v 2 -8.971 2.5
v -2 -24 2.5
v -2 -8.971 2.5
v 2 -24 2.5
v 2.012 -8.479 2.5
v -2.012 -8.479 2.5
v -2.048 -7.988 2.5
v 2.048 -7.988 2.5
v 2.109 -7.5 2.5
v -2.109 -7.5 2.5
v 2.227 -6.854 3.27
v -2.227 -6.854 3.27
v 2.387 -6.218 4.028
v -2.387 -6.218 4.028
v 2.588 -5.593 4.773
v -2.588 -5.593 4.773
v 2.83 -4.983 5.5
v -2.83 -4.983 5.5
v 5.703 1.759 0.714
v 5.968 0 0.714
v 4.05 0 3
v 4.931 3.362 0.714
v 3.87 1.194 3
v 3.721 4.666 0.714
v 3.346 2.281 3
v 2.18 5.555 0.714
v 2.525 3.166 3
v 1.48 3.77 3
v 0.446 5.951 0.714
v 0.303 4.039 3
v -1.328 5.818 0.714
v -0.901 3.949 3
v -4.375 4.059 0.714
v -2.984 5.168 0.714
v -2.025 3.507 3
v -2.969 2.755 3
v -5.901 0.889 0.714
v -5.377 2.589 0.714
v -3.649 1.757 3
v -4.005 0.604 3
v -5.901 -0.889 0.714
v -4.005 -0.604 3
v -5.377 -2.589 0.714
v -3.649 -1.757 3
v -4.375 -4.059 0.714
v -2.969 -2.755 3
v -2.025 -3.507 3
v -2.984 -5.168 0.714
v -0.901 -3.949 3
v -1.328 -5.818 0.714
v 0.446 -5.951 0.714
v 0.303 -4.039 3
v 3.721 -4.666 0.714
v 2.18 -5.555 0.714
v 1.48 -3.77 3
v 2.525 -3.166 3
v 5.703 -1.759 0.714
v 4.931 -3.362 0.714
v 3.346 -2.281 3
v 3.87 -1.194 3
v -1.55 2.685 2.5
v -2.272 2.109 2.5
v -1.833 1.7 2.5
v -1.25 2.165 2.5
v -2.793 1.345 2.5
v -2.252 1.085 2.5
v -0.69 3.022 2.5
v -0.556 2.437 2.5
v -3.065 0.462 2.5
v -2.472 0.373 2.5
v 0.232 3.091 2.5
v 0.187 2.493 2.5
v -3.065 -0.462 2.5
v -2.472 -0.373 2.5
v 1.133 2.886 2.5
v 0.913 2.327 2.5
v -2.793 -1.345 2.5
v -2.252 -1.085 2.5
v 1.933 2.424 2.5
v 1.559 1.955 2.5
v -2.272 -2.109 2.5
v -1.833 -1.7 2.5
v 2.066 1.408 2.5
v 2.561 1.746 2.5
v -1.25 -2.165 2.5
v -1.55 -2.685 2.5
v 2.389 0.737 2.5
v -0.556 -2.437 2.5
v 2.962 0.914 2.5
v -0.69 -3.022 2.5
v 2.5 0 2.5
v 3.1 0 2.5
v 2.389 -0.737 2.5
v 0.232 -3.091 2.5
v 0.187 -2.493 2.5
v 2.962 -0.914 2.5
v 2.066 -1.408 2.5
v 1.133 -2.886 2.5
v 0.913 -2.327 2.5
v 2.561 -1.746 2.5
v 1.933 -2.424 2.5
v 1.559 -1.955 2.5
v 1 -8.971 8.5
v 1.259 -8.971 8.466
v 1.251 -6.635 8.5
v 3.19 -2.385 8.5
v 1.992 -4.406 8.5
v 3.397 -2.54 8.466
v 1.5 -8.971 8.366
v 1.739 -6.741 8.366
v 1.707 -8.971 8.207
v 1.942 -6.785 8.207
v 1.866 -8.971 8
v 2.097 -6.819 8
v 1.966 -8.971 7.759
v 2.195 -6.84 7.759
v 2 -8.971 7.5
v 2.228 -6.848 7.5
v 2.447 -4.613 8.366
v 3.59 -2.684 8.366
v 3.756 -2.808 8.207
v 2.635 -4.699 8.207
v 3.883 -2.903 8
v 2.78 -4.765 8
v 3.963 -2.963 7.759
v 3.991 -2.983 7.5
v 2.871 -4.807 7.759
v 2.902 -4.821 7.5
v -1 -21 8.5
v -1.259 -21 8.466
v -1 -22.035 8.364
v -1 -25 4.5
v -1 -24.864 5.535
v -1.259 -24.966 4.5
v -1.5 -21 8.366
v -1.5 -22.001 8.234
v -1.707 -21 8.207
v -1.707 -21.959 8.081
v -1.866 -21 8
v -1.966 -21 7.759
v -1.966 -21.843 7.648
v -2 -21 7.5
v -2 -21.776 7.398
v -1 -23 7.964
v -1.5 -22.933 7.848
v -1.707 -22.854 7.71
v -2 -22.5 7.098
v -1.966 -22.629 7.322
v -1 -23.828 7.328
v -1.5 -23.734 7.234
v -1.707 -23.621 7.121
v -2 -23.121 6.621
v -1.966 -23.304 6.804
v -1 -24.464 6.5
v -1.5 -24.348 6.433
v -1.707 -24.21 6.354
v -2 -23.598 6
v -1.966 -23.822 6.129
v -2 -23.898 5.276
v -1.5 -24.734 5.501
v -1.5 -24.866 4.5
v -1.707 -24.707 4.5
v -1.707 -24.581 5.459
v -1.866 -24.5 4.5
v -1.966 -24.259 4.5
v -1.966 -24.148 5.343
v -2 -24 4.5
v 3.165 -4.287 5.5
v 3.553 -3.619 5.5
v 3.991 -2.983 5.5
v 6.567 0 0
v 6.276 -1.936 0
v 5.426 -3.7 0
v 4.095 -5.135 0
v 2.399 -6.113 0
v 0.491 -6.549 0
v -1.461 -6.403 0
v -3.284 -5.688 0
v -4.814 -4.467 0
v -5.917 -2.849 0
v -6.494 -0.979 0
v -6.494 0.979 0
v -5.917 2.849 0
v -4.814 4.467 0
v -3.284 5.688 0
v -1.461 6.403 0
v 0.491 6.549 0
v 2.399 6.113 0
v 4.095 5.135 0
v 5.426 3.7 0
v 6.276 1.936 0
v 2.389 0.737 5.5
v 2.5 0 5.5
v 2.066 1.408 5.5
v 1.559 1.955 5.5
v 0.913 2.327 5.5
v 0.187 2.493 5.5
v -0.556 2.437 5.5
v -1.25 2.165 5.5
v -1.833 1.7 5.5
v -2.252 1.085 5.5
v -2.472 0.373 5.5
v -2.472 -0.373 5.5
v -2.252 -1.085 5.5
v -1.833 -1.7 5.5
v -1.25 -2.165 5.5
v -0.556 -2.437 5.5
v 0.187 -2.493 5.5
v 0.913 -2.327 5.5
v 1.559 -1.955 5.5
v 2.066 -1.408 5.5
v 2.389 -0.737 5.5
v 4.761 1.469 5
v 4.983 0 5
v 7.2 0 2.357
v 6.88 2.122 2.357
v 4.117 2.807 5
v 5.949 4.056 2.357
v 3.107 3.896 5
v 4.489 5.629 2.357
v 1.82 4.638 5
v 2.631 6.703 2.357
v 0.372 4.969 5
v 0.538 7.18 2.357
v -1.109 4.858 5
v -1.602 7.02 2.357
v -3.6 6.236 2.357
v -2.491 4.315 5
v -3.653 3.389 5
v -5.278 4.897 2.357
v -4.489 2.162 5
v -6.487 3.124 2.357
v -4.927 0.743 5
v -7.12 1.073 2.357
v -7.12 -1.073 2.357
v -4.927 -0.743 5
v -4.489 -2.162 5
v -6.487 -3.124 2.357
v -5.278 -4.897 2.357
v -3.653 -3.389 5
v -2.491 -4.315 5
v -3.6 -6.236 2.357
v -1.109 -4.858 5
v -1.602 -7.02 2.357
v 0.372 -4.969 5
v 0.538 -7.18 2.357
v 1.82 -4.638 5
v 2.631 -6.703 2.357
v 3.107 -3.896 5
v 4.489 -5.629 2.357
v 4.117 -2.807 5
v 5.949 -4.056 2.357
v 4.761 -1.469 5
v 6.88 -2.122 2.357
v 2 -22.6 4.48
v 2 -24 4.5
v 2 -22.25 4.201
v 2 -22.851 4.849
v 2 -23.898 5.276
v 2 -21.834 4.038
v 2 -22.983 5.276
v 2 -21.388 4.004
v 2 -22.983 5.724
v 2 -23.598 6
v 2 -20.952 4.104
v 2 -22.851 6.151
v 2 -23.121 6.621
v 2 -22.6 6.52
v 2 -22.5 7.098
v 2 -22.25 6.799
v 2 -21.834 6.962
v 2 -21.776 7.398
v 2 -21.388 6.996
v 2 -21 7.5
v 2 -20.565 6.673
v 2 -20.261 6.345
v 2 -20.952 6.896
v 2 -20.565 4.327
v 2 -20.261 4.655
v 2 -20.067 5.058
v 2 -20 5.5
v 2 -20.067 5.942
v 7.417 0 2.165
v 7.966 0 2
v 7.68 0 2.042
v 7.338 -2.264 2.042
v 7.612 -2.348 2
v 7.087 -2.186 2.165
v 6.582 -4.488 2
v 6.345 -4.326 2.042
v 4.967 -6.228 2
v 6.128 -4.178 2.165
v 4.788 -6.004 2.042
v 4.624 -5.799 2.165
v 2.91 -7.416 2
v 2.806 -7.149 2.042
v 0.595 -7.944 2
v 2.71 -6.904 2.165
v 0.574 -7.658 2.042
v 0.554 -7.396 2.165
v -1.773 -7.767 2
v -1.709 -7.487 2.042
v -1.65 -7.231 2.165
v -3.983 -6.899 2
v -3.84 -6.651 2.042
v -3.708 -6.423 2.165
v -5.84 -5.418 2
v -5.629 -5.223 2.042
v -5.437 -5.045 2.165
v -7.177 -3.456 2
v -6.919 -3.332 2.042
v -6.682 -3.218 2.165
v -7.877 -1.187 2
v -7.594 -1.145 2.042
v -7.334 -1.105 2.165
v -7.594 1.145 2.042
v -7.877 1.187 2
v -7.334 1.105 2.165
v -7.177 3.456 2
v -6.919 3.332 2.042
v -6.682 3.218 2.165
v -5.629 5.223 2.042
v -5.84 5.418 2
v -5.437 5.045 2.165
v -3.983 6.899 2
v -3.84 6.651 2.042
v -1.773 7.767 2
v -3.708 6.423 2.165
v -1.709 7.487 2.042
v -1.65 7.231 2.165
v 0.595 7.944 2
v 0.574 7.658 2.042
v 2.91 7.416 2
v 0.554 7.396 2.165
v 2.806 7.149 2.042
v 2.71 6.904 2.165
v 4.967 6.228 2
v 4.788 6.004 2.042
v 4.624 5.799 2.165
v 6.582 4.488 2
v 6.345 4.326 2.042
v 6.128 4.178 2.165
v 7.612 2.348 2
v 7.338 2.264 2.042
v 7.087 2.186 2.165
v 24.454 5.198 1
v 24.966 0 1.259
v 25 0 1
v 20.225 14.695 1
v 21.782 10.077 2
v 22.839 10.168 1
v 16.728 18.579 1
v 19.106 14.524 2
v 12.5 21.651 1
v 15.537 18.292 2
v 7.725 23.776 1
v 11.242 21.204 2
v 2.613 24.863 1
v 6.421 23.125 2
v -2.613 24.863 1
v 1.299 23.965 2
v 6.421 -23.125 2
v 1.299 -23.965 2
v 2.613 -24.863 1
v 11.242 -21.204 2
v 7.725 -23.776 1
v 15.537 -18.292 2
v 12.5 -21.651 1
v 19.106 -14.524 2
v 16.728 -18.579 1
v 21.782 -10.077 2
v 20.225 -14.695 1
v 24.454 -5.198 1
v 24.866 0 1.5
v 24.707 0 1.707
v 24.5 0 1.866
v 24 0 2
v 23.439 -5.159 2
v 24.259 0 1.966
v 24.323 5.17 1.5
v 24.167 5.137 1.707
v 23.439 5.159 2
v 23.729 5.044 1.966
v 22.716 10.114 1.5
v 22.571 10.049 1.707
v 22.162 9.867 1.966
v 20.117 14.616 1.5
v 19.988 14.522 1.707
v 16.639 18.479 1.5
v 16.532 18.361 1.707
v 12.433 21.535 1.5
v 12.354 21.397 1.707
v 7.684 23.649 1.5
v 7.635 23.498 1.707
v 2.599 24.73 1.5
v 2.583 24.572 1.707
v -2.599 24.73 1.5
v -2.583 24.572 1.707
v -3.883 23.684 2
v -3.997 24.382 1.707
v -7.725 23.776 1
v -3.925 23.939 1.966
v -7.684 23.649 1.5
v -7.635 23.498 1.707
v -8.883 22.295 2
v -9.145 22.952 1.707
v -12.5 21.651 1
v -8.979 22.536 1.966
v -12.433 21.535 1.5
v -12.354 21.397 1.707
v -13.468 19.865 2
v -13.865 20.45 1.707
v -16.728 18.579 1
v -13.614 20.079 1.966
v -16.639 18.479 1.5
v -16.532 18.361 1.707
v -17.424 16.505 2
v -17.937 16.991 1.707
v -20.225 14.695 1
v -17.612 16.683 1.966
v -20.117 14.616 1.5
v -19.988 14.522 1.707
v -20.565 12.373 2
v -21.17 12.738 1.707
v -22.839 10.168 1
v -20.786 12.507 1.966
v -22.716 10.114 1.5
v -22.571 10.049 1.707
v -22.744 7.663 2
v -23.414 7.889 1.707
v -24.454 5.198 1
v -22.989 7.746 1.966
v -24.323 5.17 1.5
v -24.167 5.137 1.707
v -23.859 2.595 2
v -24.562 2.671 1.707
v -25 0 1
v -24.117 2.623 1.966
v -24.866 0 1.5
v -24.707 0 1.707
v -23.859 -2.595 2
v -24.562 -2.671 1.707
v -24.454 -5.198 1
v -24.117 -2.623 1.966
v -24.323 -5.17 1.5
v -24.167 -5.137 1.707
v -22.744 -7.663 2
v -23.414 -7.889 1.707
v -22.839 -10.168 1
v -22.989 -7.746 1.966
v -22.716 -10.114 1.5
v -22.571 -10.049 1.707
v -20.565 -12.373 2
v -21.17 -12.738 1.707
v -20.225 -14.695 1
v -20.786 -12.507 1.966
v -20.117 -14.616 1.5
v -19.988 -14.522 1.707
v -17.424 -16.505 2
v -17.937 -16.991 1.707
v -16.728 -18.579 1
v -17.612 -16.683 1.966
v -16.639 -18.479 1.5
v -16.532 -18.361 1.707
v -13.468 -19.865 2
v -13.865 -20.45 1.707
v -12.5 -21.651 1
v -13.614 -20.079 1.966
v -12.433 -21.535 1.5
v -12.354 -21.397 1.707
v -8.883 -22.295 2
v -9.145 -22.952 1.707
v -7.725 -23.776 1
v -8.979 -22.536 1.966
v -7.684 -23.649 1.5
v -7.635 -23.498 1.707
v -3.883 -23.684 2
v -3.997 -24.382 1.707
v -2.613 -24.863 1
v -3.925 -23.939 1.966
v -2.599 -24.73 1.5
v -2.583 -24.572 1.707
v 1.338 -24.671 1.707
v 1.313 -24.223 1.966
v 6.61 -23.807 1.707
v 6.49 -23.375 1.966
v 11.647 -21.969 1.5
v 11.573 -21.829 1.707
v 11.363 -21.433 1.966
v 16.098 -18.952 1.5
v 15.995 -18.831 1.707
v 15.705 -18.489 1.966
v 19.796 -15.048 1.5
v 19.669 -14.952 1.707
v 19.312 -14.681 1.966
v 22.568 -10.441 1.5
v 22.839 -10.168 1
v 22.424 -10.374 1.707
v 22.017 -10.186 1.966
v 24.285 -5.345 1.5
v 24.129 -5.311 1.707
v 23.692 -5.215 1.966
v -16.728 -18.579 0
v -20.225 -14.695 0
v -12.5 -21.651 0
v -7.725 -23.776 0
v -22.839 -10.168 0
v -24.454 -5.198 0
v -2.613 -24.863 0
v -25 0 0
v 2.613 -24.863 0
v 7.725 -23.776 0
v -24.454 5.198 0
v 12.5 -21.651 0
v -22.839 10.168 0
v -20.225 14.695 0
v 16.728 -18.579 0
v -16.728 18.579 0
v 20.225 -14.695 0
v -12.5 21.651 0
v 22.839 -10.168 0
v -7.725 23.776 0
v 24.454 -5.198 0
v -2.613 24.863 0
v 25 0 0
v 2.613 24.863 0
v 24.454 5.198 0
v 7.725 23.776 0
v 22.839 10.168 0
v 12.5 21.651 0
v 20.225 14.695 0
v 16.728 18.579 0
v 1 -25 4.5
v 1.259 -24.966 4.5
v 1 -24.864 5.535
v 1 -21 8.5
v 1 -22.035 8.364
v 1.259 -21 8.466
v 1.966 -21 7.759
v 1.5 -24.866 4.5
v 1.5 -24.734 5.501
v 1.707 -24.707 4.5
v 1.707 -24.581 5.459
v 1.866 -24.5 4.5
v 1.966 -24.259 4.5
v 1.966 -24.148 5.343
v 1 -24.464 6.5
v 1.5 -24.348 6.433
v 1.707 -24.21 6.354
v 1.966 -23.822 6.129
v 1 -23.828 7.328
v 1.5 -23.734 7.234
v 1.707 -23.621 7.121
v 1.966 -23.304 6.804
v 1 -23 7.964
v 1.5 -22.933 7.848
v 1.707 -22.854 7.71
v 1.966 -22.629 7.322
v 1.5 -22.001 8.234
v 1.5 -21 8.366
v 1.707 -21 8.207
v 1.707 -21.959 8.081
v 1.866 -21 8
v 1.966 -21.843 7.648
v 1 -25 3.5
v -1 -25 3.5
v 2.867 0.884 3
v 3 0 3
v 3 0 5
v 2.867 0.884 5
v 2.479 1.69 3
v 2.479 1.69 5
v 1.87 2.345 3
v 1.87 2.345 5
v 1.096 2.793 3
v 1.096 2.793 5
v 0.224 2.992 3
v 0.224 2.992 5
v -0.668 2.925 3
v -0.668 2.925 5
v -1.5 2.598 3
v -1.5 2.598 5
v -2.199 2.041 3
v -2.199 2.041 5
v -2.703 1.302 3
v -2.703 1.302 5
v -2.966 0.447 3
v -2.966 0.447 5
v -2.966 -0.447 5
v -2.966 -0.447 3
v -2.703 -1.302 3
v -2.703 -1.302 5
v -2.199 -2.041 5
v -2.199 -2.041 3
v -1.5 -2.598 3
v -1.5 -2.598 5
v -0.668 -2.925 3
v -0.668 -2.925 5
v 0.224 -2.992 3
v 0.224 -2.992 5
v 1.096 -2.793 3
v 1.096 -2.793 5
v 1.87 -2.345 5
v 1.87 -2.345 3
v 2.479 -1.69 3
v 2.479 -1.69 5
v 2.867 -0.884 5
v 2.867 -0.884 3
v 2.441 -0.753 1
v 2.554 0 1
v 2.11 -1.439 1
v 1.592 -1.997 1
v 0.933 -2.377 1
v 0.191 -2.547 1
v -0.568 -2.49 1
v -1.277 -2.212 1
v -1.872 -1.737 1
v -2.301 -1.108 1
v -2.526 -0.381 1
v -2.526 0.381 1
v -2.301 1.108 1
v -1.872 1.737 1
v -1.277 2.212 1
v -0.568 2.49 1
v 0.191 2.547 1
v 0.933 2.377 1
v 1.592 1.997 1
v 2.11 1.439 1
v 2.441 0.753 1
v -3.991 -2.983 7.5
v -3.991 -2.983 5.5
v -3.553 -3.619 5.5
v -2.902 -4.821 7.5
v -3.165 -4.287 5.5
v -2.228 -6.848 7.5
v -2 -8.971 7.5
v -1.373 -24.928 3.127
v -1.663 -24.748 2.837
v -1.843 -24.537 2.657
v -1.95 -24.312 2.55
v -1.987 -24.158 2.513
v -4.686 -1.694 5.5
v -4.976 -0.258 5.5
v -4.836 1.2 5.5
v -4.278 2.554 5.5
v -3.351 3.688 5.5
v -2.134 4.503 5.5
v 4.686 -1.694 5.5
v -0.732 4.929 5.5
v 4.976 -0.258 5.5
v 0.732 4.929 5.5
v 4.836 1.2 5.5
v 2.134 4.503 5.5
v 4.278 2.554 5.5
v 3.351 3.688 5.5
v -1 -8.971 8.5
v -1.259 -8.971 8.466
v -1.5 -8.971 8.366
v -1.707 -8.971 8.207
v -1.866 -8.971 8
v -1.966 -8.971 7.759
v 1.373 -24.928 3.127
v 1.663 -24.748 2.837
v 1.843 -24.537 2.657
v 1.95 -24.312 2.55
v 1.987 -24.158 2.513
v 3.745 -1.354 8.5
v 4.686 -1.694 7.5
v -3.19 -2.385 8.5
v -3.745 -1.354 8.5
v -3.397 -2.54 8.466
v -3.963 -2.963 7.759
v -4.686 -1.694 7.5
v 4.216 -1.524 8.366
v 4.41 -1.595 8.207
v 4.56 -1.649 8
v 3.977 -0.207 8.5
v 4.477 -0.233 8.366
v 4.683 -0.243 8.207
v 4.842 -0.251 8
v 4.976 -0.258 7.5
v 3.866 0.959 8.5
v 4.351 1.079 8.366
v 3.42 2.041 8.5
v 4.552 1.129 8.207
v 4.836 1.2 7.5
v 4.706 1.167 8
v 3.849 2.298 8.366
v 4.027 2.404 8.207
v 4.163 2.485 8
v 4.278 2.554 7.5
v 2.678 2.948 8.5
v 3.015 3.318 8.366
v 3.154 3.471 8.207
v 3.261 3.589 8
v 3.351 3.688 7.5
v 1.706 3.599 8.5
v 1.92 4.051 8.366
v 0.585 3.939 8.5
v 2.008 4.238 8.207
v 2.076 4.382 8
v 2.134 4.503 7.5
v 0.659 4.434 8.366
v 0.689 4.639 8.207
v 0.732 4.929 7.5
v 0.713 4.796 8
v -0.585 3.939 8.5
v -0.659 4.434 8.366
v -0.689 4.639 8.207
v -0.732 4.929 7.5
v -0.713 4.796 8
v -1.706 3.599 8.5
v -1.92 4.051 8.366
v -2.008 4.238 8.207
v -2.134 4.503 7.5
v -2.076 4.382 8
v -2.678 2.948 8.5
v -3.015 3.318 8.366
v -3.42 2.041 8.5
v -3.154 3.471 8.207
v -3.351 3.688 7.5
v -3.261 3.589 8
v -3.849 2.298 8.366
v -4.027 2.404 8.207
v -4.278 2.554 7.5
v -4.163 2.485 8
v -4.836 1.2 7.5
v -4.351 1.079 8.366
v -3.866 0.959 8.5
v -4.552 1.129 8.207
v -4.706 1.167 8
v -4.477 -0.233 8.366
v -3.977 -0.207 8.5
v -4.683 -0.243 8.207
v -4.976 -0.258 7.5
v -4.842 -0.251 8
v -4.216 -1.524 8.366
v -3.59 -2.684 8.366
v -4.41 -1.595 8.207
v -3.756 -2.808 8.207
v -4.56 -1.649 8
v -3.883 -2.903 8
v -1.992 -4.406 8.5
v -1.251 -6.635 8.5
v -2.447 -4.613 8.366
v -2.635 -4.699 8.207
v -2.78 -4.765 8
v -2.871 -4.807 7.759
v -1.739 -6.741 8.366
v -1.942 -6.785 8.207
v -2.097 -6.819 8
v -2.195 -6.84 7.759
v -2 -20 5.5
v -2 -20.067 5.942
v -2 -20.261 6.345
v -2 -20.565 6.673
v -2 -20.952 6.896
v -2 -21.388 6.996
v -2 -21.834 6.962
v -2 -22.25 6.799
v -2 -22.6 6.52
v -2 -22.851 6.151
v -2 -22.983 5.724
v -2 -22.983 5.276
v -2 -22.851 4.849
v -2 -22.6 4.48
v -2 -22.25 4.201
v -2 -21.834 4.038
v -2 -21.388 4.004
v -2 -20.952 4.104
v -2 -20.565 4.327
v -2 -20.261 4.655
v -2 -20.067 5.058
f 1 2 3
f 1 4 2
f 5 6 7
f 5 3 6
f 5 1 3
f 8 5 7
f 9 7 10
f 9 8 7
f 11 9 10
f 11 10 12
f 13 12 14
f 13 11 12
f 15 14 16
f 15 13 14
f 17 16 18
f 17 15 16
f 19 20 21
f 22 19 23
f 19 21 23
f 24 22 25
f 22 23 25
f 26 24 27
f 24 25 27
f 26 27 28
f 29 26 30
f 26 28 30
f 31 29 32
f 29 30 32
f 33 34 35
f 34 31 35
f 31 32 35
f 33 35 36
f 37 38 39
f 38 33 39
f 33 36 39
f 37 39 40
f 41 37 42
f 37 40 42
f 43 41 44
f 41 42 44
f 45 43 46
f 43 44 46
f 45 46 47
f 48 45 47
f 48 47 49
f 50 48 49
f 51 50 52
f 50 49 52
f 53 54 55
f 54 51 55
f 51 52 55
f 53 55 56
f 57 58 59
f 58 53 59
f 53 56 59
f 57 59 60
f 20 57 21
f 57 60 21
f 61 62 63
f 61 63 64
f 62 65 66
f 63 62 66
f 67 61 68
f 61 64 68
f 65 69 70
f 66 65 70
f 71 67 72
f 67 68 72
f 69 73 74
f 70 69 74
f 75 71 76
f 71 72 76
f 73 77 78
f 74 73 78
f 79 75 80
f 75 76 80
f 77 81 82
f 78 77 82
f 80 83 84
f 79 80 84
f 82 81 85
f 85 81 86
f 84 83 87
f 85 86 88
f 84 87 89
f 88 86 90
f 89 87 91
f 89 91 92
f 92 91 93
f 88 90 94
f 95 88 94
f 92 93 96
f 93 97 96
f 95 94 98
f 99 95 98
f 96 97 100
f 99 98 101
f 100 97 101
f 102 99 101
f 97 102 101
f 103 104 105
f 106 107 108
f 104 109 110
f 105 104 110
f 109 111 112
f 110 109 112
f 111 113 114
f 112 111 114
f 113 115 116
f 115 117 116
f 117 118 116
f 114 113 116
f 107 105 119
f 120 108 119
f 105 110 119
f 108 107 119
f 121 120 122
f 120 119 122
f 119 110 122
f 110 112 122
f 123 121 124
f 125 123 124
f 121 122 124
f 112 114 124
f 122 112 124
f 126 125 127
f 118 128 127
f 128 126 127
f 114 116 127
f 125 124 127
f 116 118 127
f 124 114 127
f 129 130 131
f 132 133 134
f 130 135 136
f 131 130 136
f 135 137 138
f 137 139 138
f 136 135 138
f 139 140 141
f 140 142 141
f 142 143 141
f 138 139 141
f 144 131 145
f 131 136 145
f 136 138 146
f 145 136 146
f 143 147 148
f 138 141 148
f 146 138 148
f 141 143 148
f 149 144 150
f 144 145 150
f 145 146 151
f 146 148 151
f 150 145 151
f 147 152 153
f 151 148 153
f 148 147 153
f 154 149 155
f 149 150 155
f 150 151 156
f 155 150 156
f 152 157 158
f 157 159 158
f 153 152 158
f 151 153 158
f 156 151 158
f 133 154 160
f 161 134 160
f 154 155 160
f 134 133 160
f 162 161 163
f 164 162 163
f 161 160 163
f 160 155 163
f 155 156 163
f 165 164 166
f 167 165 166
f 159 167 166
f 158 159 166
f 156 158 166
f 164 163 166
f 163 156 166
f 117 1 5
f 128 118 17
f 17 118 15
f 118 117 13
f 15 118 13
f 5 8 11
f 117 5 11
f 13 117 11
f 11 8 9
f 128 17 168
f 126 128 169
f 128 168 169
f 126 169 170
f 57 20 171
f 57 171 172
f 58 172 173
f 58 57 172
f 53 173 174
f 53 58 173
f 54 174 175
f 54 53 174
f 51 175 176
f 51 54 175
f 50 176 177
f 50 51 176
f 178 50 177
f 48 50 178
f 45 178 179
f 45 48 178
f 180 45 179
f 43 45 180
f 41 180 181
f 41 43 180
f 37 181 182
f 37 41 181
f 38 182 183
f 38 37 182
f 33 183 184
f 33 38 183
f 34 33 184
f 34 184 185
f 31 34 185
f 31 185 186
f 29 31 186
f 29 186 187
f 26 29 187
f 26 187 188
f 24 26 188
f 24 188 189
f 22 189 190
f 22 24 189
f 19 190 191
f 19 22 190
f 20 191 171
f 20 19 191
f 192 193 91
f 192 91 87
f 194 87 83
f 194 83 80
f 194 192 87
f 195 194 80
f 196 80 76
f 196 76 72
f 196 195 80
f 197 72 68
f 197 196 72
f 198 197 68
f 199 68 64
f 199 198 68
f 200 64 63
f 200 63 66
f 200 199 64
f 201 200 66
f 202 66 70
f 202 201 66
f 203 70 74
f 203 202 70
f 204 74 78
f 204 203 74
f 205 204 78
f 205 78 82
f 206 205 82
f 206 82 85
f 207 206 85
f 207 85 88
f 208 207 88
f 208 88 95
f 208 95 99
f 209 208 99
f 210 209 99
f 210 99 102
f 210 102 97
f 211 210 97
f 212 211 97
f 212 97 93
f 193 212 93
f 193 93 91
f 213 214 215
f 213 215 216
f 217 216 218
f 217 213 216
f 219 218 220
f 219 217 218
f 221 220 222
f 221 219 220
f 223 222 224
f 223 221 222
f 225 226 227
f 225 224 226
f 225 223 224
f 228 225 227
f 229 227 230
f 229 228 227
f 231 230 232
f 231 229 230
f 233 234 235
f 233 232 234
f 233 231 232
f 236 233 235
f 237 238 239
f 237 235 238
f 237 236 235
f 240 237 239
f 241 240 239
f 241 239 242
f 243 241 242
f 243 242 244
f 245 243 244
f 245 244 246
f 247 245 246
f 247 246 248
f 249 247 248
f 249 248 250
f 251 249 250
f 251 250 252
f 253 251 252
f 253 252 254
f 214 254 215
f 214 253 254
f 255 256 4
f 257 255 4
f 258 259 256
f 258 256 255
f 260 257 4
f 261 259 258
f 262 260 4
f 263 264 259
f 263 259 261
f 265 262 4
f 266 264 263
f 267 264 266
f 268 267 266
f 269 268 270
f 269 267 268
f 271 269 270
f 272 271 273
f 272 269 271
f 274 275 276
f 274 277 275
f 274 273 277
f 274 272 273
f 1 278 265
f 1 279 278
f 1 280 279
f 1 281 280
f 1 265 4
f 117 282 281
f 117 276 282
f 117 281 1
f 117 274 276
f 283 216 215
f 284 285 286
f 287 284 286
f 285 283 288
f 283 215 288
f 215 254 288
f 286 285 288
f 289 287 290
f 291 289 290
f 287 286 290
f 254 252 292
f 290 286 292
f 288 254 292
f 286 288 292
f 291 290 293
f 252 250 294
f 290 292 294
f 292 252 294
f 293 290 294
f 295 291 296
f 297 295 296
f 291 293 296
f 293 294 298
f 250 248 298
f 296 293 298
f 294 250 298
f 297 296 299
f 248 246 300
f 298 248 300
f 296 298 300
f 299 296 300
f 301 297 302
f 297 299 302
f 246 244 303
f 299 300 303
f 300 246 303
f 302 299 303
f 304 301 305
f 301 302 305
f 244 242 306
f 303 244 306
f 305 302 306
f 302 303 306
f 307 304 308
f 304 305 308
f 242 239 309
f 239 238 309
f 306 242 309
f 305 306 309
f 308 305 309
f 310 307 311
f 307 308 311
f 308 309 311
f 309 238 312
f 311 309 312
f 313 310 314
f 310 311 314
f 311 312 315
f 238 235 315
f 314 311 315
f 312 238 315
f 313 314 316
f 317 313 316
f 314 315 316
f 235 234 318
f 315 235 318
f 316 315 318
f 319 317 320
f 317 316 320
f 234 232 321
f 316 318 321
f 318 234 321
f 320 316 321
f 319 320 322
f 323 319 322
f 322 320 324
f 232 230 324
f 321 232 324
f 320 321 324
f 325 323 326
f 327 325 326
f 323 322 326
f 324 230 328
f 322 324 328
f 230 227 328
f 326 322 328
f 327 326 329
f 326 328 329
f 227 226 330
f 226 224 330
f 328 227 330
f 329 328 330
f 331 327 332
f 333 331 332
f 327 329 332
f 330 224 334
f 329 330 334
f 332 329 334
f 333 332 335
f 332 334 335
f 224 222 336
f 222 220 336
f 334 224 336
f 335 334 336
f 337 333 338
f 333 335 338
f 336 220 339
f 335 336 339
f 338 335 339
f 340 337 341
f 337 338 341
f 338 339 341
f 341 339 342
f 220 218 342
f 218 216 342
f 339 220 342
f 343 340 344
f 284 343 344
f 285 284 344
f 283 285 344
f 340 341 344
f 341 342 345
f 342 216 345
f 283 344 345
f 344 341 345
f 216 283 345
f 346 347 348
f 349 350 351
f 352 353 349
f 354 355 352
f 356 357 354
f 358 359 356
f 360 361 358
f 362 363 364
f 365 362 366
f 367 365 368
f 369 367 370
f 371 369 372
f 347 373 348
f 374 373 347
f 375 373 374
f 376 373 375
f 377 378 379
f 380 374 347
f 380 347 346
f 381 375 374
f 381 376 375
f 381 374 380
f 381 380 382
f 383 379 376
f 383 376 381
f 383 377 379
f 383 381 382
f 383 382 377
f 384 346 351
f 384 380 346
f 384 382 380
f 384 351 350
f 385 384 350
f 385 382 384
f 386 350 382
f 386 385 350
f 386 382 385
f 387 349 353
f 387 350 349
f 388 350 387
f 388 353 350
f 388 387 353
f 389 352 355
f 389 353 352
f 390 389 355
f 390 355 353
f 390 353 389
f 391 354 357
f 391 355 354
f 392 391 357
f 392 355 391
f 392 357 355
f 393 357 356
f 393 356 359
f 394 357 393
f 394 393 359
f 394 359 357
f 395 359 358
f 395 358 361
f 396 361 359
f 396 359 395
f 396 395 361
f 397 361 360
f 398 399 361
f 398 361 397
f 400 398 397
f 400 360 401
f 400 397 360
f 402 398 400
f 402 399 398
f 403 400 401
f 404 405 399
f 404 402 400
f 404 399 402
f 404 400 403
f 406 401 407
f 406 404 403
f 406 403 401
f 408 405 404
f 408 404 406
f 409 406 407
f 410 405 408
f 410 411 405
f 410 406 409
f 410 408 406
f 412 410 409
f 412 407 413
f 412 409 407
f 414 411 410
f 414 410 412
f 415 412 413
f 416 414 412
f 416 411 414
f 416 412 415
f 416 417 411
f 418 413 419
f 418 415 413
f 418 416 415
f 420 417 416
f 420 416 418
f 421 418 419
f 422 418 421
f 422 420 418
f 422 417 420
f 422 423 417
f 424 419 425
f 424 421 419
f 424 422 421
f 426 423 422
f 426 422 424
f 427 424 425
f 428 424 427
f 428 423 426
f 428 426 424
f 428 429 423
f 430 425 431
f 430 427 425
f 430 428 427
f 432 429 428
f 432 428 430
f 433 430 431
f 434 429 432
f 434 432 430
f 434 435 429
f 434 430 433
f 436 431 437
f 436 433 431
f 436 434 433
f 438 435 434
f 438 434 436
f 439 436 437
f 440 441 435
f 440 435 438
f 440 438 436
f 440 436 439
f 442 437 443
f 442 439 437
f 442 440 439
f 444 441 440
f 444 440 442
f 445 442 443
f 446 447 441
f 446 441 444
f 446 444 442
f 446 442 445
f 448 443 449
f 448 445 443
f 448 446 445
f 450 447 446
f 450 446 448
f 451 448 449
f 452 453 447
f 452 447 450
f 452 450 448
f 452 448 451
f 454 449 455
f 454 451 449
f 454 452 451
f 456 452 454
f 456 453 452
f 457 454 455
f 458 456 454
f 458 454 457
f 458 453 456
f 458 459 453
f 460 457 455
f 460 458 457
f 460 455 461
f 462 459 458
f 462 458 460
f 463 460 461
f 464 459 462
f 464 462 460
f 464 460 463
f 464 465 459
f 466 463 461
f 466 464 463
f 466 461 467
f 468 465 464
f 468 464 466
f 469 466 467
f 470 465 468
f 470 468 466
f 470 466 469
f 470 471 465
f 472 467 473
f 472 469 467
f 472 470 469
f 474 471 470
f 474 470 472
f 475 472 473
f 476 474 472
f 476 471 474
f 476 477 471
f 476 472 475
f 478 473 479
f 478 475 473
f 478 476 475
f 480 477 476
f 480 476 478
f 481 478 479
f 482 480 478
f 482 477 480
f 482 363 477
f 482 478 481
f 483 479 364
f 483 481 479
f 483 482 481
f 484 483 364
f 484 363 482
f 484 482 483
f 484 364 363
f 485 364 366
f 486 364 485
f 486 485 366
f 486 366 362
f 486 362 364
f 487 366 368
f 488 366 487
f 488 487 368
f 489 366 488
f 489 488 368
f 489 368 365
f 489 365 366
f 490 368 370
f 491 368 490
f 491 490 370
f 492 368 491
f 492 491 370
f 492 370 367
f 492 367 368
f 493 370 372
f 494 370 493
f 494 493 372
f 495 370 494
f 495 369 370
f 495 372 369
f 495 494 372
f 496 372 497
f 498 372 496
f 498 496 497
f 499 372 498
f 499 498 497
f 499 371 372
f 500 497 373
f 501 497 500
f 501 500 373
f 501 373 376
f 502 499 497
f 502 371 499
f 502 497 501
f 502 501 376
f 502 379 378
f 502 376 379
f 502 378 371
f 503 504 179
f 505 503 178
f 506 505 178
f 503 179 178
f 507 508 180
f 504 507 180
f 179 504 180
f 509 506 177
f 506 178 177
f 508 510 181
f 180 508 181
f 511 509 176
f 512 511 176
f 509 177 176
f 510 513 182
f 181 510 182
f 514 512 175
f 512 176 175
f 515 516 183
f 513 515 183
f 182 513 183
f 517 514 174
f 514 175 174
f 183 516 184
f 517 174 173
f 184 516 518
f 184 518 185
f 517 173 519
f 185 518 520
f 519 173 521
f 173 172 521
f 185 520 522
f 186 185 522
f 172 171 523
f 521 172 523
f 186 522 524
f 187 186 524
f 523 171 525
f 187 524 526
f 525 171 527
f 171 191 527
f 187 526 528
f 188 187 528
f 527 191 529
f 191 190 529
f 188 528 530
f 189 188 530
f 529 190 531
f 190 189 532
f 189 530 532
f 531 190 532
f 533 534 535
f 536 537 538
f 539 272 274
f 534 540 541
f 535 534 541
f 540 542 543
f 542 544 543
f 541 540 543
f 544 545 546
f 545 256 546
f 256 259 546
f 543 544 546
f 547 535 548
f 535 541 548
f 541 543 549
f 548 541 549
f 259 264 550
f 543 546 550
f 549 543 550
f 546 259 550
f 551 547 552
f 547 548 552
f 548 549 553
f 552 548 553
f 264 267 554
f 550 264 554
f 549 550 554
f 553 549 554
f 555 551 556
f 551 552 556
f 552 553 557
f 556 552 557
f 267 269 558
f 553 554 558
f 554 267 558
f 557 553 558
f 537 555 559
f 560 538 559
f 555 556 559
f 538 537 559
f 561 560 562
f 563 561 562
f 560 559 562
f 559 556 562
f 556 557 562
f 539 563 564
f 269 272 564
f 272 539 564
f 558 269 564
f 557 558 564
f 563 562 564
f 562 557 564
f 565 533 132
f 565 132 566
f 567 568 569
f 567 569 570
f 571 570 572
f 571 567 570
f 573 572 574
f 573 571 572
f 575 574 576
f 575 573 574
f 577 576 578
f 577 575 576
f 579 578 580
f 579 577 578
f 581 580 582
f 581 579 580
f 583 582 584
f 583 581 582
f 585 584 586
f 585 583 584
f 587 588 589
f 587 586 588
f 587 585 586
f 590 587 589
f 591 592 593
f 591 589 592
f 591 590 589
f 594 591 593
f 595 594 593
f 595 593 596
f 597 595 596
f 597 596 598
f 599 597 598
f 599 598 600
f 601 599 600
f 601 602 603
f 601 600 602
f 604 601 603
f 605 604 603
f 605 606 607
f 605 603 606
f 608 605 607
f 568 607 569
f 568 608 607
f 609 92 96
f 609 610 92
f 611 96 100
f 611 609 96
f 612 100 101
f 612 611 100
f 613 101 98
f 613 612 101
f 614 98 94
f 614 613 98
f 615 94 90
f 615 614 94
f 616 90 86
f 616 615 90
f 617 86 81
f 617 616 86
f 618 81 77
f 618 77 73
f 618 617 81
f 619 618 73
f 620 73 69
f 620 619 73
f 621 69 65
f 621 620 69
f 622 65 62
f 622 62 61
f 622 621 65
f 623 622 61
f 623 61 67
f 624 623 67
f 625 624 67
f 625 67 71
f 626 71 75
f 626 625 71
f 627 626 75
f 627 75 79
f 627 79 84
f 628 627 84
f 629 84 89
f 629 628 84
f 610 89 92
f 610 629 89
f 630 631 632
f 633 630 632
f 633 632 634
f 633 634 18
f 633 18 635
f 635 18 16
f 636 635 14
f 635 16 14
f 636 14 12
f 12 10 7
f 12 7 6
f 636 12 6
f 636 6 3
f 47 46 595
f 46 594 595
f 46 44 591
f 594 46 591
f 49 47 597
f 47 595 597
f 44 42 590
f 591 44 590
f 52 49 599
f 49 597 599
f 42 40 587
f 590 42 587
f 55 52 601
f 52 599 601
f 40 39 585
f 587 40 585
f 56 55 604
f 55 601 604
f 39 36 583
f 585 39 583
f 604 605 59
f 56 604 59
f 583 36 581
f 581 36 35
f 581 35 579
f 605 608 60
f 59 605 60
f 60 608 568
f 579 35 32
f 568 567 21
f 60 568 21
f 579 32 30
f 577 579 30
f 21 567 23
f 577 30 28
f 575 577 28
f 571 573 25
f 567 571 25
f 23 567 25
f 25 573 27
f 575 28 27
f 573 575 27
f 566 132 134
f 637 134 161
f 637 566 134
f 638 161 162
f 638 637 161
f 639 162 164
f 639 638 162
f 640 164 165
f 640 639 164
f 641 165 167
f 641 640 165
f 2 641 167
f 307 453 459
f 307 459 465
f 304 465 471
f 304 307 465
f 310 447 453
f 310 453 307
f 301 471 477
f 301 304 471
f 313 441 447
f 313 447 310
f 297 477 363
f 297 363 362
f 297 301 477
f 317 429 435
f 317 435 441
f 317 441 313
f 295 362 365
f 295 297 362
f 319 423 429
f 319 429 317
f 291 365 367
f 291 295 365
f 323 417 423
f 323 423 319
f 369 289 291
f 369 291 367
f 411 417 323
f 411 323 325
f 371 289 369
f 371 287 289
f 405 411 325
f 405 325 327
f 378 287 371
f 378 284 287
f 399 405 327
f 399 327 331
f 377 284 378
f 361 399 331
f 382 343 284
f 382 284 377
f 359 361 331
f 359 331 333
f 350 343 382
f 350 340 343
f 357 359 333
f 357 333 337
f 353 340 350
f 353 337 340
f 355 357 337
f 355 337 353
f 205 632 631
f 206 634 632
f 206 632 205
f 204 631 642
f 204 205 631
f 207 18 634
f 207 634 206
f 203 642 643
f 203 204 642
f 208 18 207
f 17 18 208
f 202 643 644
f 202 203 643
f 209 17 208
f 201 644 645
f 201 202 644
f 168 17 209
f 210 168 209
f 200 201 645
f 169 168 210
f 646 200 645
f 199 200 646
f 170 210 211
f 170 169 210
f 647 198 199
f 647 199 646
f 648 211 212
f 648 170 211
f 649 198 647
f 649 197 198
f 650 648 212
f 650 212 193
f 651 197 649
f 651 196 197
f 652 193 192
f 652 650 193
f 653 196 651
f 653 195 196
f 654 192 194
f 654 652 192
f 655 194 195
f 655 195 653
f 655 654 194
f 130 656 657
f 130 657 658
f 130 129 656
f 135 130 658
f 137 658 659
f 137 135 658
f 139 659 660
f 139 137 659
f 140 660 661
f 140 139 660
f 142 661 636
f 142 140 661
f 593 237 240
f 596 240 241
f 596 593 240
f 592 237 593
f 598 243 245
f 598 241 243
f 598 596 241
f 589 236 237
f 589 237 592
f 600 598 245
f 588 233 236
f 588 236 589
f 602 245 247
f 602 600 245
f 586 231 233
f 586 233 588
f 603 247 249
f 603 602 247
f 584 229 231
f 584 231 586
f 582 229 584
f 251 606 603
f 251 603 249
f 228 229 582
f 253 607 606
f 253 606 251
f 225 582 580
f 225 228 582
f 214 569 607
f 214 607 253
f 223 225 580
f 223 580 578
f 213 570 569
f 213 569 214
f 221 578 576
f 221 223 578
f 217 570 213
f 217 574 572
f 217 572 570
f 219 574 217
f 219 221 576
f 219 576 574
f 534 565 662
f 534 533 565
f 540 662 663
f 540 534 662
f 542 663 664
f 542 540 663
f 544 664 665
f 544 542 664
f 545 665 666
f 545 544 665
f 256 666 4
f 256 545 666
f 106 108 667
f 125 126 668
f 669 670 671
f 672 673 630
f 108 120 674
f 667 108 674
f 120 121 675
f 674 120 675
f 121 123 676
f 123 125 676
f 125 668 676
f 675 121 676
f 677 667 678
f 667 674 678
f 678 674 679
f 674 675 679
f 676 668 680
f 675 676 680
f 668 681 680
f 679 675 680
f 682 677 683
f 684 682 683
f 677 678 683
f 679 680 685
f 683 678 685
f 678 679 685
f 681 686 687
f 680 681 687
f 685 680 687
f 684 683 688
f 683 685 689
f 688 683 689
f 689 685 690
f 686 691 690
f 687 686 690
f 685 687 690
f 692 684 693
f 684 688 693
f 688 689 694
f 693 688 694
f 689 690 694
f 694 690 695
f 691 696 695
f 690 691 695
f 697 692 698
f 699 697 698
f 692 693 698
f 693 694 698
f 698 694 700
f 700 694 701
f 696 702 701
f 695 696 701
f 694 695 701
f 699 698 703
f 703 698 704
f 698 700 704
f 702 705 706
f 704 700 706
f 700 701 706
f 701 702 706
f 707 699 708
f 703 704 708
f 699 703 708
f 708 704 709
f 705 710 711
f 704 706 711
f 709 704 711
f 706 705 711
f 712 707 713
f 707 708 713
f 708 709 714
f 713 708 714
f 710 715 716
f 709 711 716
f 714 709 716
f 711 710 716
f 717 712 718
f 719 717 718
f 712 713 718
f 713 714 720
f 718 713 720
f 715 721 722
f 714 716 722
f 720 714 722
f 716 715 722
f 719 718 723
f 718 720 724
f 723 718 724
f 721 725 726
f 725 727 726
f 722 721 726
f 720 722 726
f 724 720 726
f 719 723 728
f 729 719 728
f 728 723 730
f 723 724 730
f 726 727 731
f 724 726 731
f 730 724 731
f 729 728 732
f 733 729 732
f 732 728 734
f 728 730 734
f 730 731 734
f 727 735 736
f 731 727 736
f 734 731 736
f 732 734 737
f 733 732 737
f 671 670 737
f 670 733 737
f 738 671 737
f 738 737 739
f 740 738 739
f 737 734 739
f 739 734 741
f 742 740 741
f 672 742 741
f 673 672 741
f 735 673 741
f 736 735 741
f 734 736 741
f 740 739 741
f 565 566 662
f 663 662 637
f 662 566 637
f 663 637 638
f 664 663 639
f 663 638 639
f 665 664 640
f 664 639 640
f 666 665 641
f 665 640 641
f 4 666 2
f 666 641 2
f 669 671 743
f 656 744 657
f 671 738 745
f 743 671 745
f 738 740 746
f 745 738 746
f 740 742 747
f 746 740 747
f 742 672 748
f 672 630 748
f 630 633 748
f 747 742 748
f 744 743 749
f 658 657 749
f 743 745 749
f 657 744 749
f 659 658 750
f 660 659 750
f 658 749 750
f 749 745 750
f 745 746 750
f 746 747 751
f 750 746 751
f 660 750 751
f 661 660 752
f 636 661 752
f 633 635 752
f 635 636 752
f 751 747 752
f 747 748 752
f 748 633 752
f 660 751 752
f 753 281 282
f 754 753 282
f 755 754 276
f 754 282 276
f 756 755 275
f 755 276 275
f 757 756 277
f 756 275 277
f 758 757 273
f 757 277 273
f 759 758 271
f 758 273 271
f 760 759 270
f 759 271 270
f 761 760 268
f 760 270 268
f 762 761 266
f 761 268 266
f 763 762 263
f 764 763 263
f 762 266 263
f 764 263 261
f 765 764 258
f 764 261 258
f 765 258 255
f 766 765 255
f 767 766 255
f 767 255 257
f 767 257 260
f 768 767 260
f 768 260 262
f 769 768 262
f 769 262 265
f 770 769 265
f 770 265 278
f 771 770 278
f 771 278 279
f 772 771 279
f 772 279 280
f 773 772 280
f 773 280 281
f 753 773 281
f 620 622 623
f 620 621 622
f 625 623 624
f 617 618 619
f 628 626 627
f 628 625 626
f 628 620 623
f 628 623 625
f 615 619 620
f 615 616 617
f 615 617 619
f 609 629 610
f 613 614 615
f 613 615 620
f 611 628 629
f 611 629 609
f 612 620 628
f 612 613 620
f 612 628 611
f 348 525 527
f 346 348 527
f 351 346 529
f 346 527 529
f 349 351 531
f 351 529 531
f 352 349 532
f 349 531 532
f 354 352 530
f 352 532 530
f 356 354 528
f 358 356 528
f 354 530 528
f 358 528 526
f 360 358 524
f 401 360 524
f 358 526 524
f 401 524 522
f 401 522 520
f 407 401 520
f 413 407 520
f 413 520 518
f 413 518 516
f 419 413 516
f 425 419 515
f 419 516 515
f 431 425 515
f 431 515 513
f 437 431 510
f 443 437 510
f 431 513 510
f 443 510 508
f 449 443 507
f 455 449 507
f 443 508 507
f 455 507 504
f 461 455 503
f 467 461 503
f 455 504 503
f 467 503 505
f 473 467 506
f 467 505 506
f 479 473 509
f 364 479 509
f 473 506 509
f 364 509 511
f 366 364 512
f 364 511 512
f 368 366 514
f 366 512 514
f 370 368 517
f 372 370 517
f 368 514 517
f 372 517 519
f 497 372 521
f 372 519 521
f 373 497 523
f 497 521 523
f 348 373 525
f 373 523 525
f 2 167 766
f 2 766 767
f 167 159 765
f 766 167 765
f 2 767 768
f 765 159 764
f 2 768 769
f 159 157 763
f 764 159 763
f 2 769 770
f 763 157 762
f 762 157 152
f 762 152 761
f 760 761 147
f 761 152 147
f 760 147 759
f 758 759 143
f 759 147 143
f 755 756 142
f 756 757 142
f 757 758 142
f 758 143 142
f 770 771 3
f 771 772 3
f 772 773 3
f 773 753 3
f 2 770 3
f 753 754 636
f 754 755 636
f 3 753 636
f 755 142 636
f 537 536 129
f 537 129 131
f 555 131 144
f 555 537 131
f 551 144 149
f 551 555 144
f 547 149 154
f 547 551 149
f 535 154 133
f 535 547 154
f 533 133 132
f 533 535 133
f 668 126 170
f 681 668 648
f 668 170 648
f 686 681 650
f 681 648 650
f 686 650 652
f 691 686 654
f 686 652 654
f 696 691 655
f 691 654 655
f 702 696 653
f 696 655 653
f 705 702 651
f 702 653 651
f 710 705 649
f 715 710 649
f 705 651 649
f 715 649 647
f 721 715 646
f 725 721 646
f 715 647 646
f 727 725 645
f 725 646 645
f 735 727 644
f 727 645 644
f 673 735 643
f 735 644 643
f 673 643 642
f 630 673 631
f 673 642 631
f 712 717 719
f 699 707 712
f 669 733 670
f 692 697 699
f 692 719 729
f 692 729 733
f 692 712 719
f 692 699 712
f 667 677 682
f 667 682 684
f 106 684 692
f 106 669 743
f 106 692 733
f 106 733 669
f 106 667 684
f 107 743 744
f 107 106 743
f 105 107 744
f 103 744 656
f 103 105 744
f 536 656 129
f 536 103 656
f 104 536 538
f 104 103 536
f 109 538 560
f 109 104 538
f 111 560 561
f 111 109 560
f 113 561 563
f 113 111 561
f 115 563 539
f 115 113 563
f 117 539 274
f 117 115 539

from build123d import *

# Parameters (mm, degrees)
F0_R      = 25
F1_DEPTH  = 2
F3_R      = 7.5
F4_DEPTH  = 3
F4_TAPER  = 40
F5_T      = 2
F2_R      = 3
F6_DEPTH  = 5.001
F8_R      = 2.5
F9_DEPTH  = 3
F10_R     = 3.1
F11_DEPTH = 1.5
F11_TAPER = 20
F13_R     = 4.9827011065
F14_DEPTH = 3
F15_DEPTH = 2
F16_R     = 10
F17_R     = 4
F18_R     = 1.5
F19_DEPTH = 27.001
F20_R     = 1
F21_R     = 1


# Not quite as in the source:
# - a shell that OpenCascade refuses in one call is made with other operations: the cavity is built on its own and cut out


with BuildPart() as f1:
    # F0 (on Top) → F1 (new body)
    with BuildSketch(Plane.XY):
        Circle(F0_R)
    extrude(amount=F1_DEPTH)

    # F3 (on face) → F4 (join)
    with BuildSketch(Plane.XY.offset(2)):
        Circle(F3_R)
    extrude(amount=F4_DEPTH, taper=F4_TAPER)

    # F5: shell of thickness 2, made by hand


with BuildPart() as f5_core1:
    # F5_t2: copy of F1
    add(f1.part)

    # the walls: a layer under each face that stays
    f5_faces = [f5_core1.faces().sort_by_distance(p)[0] for p in [
        (-25, 0, 1),
        (-16.6666666667, -16.6666666667, 2),
        (-6.2413505532, 0, 3.5),
        (0, 0, 5),
    ]]
    thicken(f5_faces, amount=-F5_T, mode=Mode.SUBTRACT)

    # F5_s3 → F5_t4 (revolve, cut)
    with BuildSketch(Plane.XZ):
        Polygon((7.5153208889, 2.0328557522), (7.5, 0), (6.5673846837, 0), (5.9679111138, 0.7144247806), align=None)
    revolve(axis=Axis((0, 0, 2), (0, 0, -1)), mode=Mode.SUBTRACT)


with BuildPart() as f1_1:
    add(f1.part)

    # what is left inside the walls is the cavity
    f5_cavity = [f5_core1.part.solids().sort_by_distance(p)[0] for p in [
        (0, -2.189128, 0.02),
    ]]
    add(f5_cavity, mode=Mode.SUBTRACT)

    # F2 (on Top) → F6 (cut, through all)
    with BuildSketch(Plane.XY):
        Circle(F2_R)
    extrude(amount=F6_DEPTH, mode=Mode.SUBTRACT)

    # F21
    f21_edges = [f1_1.edges().sort_by_distance(p)[0] for p in [
        (-25, 0, 2),
        (-7.5, 0, 2),
    ]]
    fillet(f21_edges, radius=F21_R)


with BuildPart() as f9:
    # F8 (on offset) → F9 (new body)
    with BuildSketch(Plane.XY.offset(5.5)):
        Circle(F8_R)
    extrude(amount=-F9_DEPTH)

    # F10 (on face) → F11 (join)
    with BuildSketch(Plane(origin=(0, 0, 2.5), x_dir=(1, 0, 0), z_dir=(0, 0, -1))):
        Circle(F10_R)
    extrude(amount=F11_DEPTH, taper=F11_TAPER)

    # F13 (on offset) → F14 (join)
    with BuildSketch(Plane.XY.offset(5.5)):
        Circle(F13_R)
    extrude(amount=F14_DEPTH)

    # F12 (on Right) → F15 (join, symmetric)
    with BuildSketch(Plane.YZ):
        Polygon((-4.9827011065, 5.5), (-2.5, 5.5), (0, 5.5), (0, 8.5), (-25, 8.5), (-25, 2.5), (-7.5, 2.5), align=None)
    extrude(amount=F15_DEPTH, both=True)

    # F16 (call 1 of 2: OpenCascade refuses the feature's edges together)
    f16_edges = [f9.edges().sort_by_distance(p)[0] for p in [
        (2, -4.563695, 7),
    ]]
    fillet(f16_edges, radius=F16_R)

    # F16#2 (call 2 of 2)
    f16_2_edges = [f9.edges().sort_by_distance(p)[0] for p in [
        (-2, -4.563695, 7),
    ]]
    fillet(f16_2_edges, radius=F16_R)

    # F17
    f17_edges = [f9.edges().sort_by_distance(p)[0] for p in [
        (0, -25, 8.5),
    ]]
    fillet(f17_edges, radius=F17_R)

    # F18 (on face) → F19 (cut, through all)
    with BuildSketch(Plane.YZ.offset(2)):
        with Locations((-21.5, 5.5)):
            Circle(F18_R)
    extrude(amount=-F19_DEPTH, mode=Mode.SUBTRACT)

    # F20
    f20_edges = [f9.edges().sort_by_distance(p)[0] for p in [
        (-2, -14.985569, 8.5),
        (0, -21, 8.5),
        (-2.510733, -5.816172, 8.5),
        (2, -14.985569, 8.5),
        (0, 4.982701, 8.5),
        (2.510733, -5.816172, 8.5),
        (-2, -23.828427, 7.328427),
        (0, -25, 4.5),
        (2, -23.828427, 7.328427),
        (-2, -25, 3.5),
        (0, -25, 2.5),
        (2, -25, 3.5),
    ]]
    fillet(f20_edges, radius=F20_R)


solid = Compound([f1_1.part, f9.part])
